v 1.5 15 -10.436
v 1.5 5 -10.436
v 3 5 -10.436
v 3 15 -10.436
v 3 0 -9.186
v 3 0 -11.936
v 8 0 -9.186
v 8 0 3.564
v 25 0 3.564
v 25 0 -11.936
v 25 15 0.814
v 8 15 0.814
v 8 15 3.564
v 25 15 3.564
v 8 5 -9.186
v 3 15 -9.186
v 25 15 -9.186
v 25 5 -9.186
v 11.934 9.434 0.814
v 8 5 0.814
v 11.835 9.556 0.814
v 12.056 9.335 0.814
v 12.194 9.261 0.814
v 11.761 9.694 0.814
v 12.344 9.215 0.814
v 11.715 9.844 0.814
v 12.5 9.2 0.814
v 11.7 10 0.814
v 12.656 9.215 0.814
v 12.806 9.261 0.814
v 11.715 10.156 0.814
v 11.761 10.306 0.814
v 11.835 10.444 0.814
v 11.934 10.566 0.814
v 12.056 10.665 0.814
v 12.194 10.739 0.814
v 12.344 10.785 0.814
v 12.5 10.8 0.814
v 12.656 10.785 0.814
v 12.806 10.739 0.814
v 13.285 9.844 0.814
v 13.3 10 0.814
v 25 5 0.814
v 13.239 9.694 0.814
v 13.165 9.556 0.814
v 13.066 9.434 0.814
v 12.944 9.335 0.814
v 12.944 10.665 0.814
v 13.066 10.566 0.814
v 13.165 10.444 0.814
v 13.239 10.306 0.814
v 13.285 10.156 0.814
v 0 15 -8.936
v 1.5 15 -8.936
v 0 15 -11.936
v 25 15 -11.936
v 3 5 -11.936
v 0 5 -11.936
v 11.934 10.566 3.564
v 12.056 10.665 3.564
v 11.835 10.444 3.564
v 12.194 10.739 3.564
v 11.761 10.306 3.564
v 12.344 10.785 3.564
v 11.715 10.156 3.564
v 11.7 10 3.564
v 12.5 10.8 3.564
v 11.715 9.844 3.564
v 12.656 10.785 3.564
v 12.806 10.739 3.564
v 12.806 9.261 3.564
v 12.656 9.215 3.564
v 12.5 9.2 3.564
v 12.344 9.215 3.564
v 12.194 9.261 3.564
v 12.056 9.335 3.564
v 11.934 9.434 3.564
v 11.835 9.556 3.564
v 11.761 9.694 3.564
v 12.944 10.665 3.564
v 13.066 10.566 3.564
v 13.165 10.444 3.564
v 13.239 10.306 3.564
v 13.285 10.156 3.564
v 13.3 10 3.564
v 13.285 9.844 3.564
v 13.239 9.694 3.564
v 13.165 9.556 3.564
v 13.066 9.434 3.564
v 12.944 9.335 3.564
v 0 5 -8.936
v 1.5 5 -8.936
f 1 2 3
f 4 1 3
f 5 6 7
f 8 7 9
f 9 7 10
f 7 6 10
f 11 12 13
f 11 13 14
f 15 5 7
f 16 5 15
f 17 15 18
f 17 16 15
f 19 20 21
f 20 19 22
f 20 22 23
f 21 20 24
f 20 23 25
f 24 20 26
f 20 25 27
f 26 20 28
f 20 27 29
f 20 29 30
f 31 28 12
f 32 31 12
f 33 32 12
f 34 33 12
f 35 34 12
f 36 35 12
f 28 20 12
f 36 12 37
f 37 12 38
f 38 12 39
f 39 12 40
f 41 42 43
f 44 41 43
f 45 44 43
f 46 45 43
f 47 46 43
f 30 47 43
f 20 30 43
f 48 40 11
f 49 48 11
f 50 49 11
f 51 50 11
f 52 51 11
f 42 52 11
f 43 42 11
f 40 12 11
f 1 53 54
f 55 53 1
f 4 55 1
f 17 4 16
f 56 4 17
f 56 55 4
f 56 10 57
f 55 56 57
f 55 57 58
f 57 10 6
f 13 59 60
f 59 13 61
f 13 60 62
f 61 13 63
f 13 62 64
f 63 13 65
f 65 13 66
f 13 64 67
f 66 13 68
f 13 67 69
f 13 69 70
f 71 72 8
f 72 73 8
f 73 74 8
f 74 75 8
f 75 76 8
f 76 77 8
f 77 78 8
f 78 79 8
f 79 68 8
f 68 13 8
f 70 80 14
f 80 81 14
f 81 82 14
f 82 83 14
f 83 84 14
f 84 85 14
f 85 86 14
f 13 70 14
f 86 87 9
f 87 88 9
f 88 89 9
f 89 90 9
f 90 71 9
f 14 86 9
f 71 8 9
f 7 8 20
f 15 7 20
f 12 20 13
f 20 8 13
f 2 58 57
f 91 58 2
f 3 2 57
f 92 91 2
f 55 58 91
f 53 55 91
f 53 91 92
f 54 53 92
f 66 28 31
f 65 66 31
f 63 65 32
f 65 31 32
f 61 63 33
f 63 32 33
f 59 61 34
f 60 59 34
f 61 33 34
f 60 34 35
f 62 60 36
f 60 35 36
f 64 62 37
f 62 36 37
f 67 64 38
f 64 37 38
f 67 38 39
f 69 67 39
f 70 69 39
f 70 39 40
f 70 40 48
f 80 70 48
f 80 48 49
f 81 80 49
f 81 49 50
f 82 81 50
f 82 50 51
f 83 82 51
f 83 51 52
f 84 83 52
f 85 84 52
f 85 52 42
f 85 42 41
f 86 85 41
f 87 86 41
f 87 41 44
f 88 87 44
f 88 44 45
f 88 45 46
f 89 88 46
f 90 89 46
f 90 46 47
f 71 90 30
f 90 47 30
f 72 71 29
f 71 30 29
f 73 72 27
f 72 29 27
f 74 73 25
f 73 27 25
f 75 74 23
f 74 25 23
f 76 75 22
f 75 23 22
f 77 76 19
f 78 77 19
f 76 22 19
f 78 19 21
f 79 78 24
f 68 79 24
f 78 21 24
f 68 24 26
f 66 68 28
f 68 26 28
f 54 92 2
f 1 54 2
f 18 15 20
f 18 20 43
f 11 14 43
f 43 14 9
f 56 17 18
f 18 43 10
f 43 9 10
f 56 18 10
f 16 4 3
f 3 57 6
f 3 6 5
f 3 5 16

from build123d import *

# Parameters (mm, degrees)
BOSS_EXTRUDE1_DEPTH       = 15
SKETCH2_W                 = 22
SKETCH2_H                 = 10
CUT_EXTRUDE1_DEPTH        = 10
M2X0_4_TAPPED_HOLE1_D     = 1.6
M2X0_4_TAPPED_HOLE1_DEPTH = 2.75
SKETCH6_W                 = 3
SKETCH6_H                 = 15.5
CUT_EXTRUDE2_DEPTH        = 5
SKETCH7_W                 = 3
SKETCH7_H                 = 10
CUT_EXTRUDE4_DEPTH        = 3
CUT_EXTRUDE5_REACH        = 35.019
SKETCH8_W                 = 5
SKETCH8_H                 = 15


with BuildPart() as part:
    # Sketch1 → Boss-Extrude1 (new body)
    with BuildSketch(Plane(origin=(0, 0, 0), x_dir=(1, 0, 0), z_dir=(0, 1, 0))):
        Polygon((0, -0.563585479), (0, -3.563585479), (25, -3.563585479), (25, 11.936414521), (0, 11.936414521), (0, 8.936414521), (1.5, 8.936414521), (1.5, 10.436414521), (3, 10.436414521), (3, -2.063585479), (1.5, -2.063585479), (1.5, -0.563585479), align=None)
    extrude(amount=BOSS_EXTRUDE1_DEPTH)

    # Sketch2 → Cut-Extrude1 (cut)
    with BuildSketch(Plane(origin=(0, 15, 0), x_dir=(1, 0, 0), z_dir=(0, 1, 0))):
        with Locations((14, 4.186414521)):
            Rectangle(SKETCH2_W, SKETCH2_H)
    extrude(amount=-CUT_EXTRUDE1_DEPTH, mode=Mode.SUBTRACT)

    # M2x0.4 Tapped Hole1
    with Locations(Plane.XY.offset(3.563585479)):
        with Locations((12.5, 10)):
            Hole(M2X0_4_TAPPED_HOLE1_D / 2, depth=M2X0_4_TAPPED_HOLE1_DEPTH)

    # Sketch6 → Cut-Extrude2 (cut)
    with BuildSketch(Plane.XZ):
        with Locations((1.5, -4.186414521)):
            Rectangle(SKETCH6_W, SKETCH6_H)
    extrude(amount=-CUT_EXTRUDE2_DEPTH, mode=Mode.SUBTRACT)

    # Sketch7 → Cut-Extrude4 (cut)
    with BuildSketch(Plane.XY.offset(3.563585479)):
        with Locations((1.5, 10)):
            Rectangle(SKETCH7_W, SKETCH7_H)
    extrude(amount=-CUT_EXTRUDE4_DEPTH, mode=Mode.SUBTRACT)

    # Cut-Extrude5: up to this face of the body (flat: up to its plane)
    cut_extrude5_end = Plane(part.part.faces().sort_by_distance((14, 10, -9.186414521))[0])
    # Sketch8 → Cut-Extrude5 (cut, up to the picked face)
    with BuildSketch(Plane.XY.offset(3.563585479), mode=Mode.PRIVATE) as cut_extrude5_sk1:
        with Locations((5.5, 7.5)):
            Rectangle(SKETCH8_W, SKETCH8_H)
    cut_extrude5_tool1 = split(extrude(cut_extrude5_sk1.sketch, amount=-CUT_EXTRUDE5_REACH, mode=Mode.PRIVATE), bisect_by=cut_extrude5_end, keep=Keep.BOTH, mode=Mode.PRIVATE)
    add(cut_extrude5_tool1.solids().sort_by(Axis((5.5, 7.5, 3.563585), (0, 0, -1)))[0], mode=Mode.SUBTRACT)


solid = part.part
